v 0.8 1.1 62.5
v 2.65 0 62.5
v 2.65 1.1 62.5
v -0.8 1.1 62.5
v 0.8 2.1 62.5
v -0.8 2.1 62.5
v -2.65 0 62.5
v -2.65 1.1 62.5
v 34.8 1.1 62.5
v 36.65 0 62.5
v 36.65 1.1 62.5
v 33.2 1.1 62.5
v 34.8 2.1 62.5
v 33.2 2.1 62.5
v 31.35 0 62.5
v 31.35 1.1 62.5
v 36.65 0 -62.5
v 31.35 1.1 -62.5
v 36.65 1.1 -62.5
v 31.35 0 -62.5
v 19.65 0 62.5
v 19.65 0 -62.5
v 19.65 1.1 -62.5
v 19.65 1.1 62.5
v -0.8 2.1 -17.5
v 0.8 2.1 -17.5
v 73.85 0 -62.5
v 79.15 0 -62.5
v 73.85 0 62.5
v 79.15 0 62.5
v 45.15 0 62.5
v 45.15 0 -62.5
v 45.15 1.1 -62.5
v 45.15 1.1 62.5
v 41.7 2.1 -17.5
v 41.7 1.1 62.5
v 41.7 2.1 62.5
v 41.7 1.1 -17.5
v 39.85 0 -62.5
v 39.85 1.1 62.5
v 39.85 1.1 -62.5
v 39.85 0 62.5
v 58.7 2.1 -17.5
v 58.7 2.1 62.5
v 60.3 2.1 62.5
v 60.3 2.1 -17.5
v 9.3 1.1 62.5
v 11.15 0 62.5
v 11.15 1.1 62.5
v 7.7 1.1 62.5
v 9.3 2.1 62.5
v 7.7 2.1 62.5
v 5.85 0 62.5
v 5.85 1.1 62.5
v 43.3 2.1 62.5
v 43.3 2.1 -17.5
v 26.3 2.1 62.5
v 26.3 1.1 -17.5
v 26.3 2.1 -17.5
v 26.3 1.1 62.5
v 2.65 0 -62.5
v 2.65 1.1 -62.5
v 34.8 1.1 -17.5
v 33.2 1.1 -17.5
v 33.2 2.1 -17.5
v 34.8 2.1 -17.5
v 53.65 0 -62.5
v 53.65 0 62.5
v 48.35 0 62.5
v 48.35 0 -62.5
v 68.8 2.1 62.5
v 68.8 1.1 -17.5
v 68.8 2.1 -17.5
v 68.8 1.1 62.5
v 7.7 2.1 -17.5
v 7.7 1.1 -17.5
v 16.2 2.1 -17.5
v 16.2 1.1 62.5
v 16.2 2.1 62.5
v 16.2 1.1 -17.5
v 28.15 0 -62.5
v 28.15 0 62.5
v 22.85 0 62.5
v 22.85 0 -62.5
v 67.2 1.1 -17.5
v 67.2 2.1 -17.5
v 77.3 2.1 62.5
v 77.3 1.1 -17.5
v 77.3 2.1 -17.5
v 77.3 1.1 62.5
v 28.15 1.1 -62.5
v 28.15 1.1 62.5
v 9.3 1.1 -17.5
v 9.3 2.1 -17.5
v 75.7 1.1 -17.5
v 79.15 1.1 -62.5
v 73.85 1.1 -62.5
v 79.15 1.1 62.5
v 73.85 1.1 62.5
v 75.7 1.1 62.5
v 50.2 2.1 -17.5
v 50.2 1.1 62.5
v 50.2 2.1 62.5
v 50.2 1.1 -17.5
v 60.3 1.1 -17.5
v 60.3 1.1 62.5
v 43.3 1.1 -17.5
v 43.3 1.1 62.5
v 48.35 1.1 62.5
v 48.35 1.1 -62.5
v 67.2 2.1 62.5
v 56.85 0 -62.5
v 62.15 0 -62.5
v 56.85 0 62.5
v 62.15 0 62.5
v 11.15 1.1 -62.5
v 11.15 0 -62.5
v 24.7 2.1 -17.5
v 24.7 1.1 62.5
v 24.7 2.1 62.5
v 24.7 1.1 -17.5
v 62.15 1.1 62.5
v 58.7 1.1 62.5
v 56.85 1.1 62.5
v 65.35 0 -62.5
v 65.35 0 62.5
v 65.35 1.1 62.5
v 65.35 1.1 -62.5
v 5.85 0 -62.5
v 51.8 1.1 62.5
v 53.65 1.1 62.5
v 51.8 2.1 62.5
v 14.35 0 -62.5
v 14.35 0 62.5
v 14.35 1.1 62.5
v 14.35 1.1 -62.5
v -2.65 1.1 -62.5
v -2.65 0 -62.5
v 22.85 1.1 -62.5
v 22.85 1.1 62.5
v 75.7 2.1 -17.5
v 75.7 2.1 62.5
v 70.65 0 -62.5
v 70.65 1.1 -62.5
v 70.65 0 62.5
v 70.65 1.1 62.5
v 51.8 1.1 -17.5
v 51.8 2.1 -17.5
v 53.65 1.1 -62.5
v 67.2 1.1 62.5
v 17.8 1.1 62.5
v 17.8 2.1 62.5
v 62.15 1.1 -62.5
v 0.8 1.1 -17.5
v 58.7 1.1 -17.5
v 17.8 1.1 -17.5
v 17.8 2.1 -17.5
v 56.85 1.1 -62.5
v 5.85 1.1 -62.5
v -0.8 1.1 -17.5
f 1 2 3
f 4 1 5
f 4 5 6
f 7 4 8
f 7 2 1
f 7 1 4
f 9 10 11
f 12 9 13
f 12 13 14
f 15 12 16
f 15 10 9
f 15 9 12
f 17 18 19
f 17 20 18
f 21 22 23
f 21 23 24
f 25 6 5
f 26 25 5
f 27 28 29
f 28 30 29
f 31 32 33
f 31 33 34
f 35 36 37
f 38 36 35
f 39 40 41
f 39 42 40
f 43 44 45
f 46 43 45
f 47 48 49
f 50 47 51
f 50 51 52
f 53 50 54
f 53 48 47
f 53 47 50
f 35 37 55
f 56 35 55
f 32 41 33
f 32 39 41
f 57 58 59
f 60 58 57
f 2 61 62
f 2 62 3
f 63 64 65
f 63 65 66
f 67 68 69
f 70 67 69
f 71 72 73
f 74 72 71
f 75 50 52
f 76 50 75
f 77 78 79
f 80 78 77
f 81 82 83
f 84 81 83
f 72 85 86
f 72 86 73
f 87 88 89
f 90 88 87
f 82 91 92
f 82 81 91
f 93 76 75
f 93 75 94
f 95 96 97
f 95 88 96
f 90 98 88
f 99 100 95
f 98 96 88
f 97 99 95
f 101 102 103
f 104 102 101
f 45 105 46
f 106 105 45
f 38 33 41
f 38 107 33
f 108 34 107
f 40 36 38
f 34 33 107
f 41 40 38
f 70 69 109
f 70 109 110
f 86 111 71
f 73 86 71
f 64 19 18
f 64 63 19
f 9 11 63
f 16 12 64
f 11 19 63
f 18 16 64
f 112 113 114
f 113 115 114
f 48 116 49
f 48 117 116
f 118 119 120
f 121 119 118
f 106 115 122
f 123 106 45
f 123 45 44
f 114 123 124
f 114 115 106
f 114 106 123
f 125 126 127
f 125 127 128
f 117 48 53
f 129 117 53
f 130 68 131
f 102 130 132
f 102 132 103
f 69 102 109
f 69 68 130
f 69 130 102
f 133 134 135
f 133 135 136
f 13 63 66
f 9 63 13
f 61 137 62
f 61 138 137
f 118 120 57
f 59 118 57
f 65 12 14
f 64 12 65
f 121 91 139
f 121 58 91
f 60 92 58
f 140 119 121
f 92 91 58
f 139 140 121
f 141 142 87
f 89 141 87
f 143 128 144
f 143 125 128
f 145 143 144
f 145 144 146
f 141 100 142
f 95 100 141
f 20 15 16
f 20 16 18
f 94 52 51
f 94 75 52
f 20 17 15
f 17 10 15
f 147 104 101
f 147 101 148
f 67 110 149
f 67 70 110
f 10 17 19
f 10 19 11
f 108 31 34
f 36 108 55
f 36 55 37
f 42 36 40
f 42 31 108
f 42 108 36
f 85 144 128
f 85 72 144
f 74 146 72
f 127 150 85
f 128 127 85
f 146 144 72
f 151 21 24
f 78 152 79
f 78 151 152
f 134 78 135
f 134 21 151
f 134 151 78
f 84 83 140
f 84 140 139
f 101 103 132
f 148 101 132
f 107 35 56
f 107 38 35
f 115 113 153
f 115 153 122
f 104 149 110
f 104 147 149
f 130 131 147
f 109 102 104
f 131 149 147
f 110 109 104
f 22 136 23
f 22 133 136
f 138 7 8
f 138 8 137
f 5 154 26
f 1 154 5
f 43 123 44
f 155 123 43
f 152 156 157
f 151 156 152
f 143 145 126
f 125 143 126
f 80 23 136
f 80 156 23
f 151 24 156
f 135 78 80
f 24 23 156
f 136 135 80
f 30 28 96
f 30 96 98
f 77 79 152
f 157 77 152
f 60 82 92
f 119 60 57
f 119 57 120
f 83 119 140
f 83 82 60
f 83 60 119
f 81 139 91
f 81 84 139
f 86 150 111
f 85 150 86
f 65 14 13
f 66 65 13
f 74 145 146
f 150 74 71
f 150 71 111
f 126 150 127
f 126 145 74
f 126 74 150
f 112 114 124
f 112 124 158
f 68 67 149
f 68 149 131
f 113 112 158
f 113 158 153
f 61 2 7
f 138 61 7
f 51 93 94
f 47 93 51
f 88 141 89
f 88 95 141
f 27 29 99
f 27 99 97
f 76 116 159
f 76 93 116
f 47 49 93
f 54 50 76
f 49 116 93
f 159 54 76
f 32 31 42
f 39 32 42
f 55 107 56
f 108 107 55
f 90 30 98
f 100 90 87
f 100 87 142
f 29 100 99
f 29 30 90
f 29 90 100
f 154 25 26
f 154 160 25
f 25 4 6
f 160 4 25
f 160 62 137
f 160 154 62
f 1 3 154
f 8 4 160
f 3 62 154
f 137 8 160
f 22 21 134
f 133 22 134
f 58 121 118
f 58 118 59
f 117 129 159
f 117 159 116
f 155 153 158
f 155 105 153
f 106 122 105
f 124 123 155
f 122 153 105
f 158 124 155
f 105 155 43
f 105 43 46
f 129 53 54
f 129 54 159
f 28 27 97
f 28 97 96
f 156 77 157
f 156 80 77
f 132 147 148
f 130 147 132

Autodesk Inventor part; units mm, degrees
ref_plane "YZ Plane" through (0, 0, 0) normal (1, 0, 0) x (0, 1, 0)
ref_plane "XZ Plane" through (0, 0, 0) normal (0, 1, 0) x (-1, 0, 0)
ref_plane "XY Plane" through (0, 0, 0) normal (0, 0, 1) x (1, 0, 0)
sketch "Sketch1" plane through (0, 0, 0) normal (0, 1, 0) x (-1, 0, 0)
  line L0 (2.65, -62.5) -> (-2.65, -62.5)
  line L1 (-2.65, -62.5) -> (-2.65, 62.5)
  line L2 (-2.65, 62.5) -> (2.65, 62.5)
  line L3 (2.65, 62.5) -> (2.65, -62.5)
  line L4 (2.65, -62.5) -> (-2.65, 62.5) construction
  line L5 (-2.65, -62.5) -> (2.65, 62.5) construction
  point P0 (0, 0)
  dimension "d0" = 5.3
  dimension "d1" = 125
extrude "Extrusion1" add sketch "Sketch1" along normal blind 1.1
sketch "Sketch2" plane through (0, 1.1, 0) normal (0, 1, 0) x (1, 0, 0)
  line L0 (-2.65, -62.5) -> (2.65, -62.5) projected
  line L1 (0.8, -62.5) -> (-0.8, -62.5)
  line L2 (-0.8, -62.5) -> (-0.8, 17.5)
  line L3 (-0.8, 17.5) -> (0.8, 17.5)
  line L4 (0.8, 17.5) -> (0.8, -62.5)
  line L5 (-2.65, 62.5) -> (-2.65, -62.5) projected
  point P0 (0, 0)
  dimension "d4" = 1.6
  dimension "d5" = 80
  dimension "d6" = 5.3
  dimension "d7" = 1.6
  dimension "d8" = 1.85
extrude "Extrusion2" add sketch "Sketch2" along normal blind 1
pattern_linear "Rectangular Pattern1" count 10 spacing 8.5 along (1, 0, 0) of "Extrusion1", "Extrusion2"
equation "\"d8\" = 0.5 * d6 - 0.5 * d7"
equation "\"base_add\" = 0.6"
properties part number "structure4"
